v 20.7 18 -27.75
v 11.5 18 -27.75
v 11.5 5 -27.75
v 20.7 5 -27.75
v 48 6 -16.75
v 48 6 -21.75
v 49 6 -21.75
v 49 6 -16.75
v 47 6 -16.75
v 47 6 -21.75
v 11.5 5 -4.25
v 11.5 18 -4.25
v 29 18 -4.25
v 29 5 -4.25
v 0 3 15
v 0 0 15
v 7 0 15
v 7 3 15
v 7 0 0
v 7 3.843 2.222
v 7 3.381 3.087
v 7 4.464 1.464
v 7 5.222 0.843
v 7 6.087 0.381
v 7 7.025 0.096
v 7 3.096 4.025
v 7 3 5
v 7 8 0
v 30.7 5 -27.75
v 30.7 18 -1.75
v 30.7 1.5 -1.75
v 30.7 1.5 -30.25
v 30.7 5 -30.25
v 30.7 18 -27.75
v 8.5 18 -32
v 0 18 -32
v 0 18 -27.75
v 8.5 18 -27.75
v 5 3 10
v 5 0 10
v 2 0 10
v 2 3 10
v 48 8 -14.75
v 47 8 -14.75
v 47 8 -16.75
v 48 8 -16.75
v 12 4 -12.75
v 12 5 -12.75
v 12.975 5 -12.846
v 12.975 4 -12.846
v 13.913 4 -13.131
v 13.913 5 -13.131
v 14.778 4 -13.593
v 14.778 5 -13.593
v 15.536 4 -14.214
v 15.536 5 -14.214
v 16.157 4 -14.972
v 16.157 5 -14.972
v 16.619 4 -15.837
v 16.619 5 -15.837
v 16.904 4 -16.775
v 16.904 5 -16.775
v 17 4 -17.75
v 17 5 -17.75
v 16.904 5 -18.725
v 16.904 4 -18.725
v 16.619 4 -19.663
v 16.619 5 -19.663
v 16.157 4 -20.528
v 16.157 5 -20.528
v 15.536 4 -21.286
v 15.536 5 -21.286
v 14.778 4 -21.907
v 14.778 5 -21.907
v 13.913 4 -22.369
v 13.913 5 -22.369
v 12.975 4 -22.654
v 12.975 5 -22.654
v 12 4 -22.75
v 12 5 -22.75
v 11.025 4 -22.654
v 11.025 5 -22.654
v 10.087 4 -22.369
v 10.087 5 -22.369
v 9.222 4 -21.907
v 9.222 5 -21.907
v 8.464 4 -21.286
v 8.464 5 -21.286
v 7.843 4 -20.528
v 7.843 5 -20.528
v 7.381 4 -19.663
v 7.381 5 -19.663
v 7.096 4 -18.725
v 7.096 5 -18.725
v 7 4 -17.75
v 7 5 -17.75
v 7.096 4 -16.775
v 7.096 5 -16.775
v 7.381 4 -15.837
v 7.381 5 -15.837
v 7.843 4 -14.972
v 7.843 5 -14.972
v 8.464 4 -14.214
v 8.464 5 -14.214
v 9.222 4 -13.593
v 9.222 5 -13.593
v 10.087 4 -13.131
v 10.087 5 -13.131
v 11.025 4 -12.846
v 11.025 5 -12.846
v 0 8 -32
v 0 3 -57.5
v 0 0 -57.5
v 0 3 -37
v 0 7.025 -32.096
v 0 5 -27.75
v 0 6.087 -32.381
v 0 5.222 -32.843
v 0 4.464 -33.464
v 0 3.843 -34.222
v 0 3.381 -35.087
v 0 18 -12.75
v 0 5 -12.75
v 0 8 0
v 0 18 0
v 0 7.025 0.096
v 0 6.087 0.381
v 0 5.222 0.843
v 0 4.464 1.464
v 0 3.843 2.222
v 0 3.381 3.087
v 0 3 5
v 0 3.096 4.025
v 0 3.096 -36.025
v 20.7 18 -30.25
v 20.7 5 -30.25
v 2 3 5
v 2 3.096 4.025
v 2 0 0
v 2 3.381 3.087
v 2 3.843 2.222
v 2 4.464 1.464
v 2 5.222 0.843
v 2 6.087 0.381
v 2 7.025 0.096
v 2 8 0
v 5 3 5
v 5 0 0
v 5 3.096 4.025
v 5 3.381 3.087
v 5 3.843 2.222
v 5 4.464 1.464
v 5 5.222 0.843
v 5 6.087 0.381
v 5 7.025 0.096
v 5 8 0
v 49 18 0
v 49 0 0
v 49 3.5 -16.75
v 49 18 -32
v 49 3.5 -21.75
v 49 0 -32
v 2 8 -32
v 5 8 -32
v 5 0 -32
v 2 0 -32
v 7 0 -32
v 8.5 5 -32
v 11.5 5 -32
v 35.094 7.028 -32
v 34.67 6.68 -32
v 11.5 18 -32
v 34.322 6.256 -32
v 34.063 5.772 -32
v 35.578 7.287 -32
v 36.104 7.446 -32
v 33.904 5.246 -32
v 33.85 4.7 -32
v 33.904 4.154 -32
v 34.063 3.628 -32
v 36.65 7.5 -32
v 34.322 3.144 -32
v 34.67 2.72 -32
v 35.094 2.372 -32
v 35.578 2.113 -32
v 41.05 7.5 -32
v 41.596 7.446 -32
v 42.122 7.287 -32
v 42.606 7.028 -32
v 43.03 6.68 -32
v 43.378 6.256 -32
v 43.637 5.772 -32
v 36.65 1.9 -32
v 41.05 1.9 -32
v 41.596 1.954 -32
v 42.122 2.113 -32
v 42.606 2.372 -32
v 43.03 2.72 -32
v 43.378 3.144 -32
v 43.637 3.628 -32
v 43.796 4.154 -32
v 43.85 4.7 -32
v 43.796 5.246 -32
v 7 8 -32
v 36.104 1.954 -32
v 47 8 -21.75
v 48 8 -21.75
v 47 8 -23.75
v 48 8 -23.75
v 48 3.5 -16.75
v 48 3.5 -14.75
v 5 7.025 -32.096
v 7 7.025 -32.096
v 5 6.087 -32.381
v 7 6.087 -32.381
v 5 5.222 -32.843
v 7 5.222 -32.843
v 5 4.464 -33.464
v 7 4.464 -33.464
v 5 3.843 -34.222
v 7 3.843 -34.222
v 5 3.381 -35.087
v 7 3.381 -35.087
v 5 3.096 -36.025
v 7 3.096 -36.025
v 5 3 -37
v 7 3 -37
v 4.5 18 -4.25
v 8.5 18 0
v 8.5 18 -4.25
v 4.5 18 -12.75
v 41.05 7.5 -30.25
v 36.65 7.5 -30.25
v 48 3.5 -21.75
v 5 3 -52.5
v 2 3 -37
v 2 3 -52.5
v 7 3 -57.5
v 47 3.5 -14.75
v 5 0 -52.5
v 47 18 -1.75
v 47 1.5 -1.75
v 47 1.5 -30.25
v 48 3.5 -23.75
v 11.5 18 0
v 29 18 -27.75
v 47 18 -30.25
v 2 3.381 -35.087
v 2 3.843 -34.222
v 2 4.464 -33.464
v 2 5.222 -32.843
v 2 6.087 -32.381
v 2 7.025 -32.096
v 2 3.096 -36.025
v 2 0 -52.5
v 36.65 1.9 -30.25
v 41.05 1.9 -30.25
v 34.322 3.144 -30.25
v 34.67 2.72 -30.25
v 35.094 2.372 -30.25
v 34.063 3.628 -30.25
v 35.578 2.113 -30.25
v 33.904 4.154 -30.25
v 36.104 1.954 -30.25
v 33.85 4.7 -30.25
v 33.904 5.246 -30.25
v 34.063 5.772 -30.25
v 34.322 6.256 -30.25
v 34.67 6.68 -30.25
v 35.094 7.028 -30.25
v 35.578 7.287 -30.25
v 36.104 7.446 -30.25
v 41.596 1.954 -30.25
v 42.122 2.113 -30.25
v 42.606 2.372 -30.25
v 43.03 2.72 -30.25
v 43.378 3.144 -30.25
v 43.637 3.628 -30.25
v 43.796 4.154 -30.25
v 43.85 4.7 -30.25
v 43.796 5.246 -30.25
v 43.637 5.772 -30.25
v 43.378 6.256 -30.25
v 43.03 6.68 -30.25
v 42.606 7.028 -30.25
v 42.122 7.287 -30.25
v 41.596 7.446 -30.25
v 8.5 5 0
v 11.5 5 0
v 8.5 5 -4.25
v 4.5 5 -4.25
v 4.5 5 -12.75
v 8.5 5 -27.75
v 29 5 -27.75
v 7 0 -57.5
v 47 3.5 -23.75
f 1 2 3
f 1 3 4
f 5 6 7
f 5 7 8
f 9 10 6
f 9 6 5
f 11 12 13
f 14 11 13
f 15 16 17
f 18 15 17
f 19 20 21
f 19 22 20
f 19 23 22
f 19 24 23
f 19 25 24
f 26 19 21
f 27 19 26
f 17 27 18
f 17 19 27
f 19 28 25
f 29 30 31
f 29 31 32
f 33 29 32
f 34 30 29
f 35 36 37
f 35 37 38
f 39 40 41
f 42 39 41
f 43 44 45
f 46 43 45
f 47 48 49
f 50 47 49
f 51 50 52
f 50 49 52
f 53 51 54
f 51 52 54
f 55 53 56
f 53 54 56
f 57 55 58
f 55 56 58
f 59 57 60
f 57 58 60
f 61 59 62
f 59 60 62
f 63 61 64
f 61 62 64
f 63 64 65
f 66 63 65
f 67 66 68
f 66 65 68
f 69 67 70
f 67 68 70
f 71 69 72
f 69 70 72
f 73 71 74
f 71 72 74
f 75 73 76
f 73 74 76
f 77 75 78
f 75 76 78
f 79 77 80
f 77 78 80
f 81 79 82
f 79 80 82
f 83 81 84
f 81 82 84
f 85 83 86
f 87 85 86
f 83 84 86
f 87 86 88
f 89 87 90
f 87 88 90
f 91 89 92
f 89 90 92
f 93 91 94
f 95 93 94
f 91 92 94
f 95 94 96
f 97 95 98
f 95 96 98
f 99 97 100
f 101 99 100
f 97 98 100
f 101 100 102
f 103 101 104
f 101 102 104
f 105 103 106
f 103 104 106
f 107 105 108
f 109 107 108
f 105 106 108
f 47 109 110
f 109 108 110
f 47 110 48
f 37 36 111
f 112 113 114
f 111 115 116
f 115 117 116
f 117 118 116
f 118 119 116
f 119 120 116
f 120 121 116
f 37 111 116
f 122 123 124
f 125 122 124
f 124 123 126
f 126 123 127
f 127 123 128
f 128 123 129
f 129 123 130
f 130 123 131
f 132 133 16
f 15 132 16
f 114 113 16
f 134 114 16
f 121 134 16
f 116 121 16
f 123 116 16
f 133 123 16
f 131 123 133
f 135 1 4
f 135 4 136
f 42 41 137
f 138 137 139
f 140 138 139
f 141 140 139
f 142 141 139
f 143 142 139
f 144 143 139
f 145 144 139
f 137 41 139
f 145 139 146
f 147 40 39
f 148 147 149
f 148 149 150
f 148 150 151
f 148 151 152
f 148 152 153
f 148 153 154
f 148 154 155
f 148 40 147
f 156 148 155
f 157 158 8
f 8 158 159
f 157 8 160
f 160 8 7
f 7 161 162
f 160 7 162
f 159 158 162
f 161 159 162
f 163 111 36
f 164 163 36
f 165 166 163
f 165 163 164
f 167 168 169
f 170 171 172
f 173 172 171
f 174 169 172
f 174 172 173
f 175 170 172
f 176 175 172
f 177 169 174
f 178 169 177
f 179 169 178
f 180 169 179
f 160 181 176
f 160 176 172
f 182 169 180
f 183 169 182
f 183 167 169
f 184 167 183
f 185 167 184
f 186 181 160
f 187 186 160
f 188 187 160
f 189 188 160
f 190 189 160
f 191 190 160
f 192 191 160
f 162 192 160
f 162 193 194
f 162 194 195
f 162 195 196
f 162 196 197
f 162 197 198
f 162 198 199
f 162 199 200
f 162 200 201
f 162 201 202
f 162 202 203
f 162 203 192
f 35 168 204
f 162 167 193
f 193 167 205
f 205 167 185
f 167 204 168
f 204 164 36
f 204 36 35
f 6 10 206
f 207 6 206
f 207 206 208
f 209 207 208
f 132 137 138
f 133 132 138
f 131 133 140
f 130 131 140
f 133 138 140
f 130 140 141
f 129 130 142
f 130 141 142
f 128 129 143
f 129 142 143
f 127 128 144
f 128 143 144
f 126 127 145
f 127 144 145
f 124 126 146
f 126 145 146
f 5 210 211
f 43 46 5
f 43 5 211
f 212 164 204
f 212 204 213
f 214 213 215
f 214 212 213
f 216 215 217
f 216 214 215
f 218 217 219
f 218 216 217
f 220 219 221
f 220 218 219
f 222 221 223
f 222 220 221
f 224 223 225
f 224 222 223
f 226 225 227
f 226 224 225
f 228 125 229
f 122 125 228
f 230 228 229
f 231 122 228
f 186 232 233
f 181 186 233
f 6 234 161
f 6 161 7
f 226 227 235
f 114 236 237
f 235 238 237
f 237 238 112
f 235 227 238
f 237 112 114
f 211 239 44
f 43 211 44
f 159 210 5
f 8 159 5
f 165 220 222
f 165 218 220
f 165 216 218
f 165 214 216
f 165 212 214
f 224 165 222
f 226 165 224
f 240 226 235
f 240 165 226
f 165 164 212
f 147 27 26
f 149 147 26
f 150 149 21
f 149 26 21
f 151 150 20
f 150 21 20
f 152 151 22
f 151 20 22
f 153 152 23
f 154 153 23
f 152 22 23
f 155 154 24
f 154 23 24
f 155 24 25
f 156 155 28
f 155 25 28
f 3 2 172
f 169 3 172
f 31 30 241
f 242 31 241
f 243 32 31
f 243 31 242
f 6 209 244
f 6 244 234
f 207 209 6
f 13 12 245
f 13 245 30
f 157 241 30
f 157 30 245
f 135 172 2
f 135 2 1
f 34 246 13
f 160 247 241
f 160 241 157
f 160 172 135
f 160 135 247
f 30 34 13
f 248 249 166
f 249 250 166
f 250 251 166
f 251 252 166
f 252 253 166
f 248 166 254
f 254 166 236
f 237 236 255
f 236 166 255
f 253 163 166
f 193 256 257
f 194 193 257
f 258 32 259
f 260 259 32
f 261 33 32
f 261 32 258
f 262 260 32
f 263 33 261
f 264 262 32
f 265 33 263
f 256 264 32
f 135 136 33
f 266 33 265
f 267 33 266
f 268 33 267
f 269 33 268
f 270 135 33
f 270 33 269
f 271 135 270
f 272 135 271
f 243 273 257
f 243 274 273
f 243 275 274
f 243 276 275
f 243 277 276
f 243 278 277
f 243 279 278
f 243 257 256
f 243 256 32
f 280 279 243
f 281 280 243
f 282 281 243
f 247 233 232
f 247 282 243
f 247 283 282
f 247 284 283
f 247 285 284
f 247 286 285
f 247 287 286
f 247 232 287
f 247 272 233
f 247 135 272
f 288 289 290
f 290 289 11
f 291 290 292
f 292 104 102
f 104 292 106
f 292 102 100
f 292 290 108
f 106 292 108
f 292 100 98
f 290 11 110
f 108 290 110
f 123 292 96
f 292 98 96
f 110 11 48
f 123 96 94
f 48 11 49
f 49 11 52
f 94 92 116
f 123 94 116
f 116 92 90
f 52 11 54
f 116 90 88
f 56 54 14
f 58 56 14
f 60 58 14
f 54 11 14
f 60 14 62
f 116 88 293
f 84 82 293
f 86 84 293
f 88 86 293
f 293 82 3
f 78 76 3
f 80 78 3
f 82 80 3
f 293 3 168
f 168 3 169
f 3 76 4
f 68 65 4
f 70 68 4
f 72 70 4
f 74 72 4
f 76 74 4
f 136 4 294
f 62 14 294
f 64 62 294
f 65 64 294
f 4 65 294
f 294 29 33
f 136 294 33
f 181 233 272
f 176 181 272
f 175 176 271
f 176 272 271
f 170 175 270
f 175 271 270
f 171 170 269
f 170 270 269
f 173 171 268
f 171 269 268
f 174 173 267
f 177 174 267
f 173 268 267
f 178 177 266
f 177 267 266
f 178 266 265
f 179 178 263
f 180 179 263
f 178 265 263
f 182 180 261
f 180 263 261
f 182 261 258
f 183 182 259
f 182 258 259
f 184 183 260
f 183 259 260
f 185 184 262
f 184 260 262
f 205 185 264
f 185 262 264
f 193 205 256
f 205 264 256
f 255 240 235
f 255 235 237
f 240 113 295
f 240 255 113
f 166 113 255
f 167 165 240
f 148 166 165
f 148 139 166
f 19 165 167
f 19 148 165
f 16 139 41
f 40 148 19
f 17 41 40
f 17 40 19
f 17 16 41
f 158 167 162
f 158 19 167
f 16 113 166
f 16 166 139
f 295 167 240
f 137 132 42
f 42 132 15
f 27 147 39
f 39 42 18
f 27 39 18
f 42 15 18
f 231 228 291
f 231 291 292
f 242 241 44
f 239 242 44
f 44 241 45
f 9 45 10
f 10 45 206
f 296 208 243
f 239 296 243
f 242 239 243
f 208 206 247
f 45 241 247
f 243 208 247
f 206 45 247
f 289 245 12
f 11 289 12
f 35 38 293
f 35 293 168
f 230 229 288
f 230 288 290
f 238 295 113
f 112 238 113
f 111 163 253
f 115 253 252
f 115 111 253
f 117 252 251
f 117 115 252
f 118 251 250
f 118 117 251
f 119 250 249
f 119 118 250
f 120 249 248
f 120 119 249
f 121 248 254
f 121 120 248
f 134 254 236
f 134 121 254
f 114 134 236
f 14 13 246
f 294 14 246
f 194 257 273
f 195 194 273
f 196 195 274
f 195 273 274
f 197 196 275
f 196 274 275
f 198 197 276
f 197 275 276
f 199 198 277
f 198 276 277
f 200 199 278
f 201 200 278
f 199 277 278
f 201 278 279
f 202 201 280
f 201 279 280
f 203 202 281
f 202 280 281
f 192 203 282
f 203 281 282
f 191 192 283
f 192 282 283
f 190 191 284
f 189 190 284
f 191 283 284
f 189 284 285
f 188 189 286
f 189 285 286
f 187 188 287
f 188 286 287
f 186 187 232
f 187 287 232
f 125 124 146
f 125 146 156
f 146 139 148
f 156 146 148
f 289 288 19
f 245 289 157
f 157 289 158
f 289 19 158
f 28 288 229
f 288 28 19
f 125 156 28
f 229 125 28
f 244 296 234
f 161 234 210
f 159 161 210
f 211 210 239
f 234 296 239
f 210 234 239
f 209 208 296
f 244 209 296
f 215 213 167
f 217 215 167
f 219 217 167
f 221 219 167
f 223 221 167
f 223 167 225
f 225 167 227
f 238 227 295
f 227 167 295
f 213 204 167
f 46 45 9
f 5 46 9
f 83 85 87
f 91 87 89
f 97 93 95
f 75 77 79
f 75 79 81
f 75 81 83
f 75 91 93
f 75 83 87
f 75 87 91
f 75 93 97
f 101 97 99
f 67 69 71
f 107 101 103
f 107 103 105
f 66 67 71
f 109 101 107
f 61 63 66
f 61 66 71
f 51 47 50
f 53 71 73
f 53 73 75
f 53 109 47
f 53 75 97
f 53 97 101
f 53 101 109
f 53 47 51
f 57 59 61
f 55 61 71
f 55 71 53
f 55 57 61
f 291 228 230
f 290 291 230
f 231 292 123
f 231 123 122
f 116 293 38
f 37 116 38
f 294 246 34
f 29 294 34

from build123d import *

# Parameters (mm, degrees)
SKETCH_1_W           = 49
SKETCH_1_H           = 32
EXTRUDE_2_DEPTH      = 18
SKETCH_6_W           = 24.5
SKETCH_6_H           = 23.5
CUT_EXTRUDE_1_DEPTH  = 13
SKETCH_7_W           = 16.3
SKETCH_7_H           = 28.5
CUT_EXTRUDE_2_DEPTH  = 16.5
SKETCH_8_W           = 3
SKETCH_8_H           = 32
CUT_EXTRUDE_3_DEPTH  = 13
SKETCH_12_W          = 15
SKETCH_12_H          = 13
CUT_EXTRUDE_5_DEPTH  = 58.690987164
SKETCH_13_W          = 10
SKETCH_13_H          = 2.5
CUT_EXTRUDE_6_DEPTH  = 13
CUT_EXTRUDE_7_DEPTH  = 61.332930477
SKETCH_15_W          = 7
SKETCH_15_H          = 25.5
EXTRUDE_3_DEPTH      = 3
SKETCH_16_W          = 7
SKETCH_16_H          = 15
EXTRUDE_4_DEPTH      = 3
FILLET_1_R           = 5
SKETCH_17_W          = 3
SKETCH_17_H          = 10
SKETCH_17_H_2        = 20.5
CUT_EXTRUDE_8_DEPTH  = 78.661122835
SKETCH_19_R          = 5
CUT_EXTRUDE_9_DEPTH  = 1
CUT_EXTRUDE_10_DEPTH = 1
SKETCH_25_W          = 5
SKETCH_25_H          = 2.5
CUT_EXTRUDE_13_DEPTH = 78.034083366


with BuildPart() as part:
    # 草图1 → 凸台-拉伸2 (new body)
    with BuildSketch(Plane(origin=(0, 0, 0), x_dir=(1, 0, 0), z_dir=(0, 1, 0))):
        with Locations((24.5, 16)):
            Rectangle(SKETCH_1_W, SKETCH_1_H)
    extrude(amount=EXTRUDE_2_DEPTH)

    # 草图6 → 切除-拉伸1 (cut)
    with BuildSketch(Plane(origin=(0, 18, 0), x_dir=(1, 0, 0), z_dir=(0, 1, 0))):
        with Locations((16.75, 16)):
            Rectangle(SKETCH_6_W, SKETCH_6_H)
    extrude(amount=-CUT_EXTRUDE_1_DEPTH, mode=Mode.SUBTRACT)

    # 草图7 → 切除-拉伸2 (cut)
    with BuildSketch(Plane(origin=(0, 18, 0), x_dir=(1, 0, 0), z_dir=(0, 1, 0))):
        with Locations((38.85, 16)):
            Rectangle(SKETCH_7_W, SKETCH_7_H)
    extrude(amount=-CUT_EXTRUDE_2_DEPTH, mode=Mode.SUBTRACT)

    # 草图8 → 切除-拉伸3 (cut)
    with BuildSketch(Plane(origin=(0, 18, 0), x_dir=(1, 0, 0), z_dir=(0, 1, 0))):
        with Locations((10, 16)):
            Rectangle(SKETCH_8_W, SKETCH_8_H)
    extrude(amount=-CUT_EXTRUDE_3_DEPTH, mode=Mode.SUBTRACT)

    # 草图12 → 切除-拉伸5 (cut, through all)
    with BuildSketch(Plane(origin=(4.5, 0, 0), x_dir=(0, 0, -1), z_dir=(1, 0, 0))):
        with Locations((20.25, 11.5)):
            Rectangle(SKETCH_12_W, SKETCH_12_H)
    extrude(amount=-CUT_EXTRUDE_5_DEPTH, mode=Mode.SUBTRACT)

    # 草图13 → 切除-拉伸6 (cut)
    with BuildSketch(Plane(origin=(0, 18, 0), x_dir=(1, 0, 0), z_dir=(0, 1, 0))):
        with Locations((25.7, 29)):
            Rectangle(SKETCH_13_W, SKETCH_13_H)
    extrude(amount=-CUT_EXTRUDE_6_DEPTH, mode=Mode.SUBTRACT)

    # 草图14 → 切除-拉伸7 (cut, through all)
    with BuildSketch(Plane(origin=(0, 0, -1.75), x_dir=(-1, 0, 0), z_dir=(0, 0, -1))):
        with BuildLine():
            Line((-41.05, 7.5), (-36.65, 7.5))
            ThreePointArc((-36.65, 7.5), (-33.85, 4.7), (-36.65, 1.9))
            Line((-36.65, 1.9), (-41.05, 1.9))
            ThreePointArc((-41.05, 1.9), (-43.85, 4.7), (-41.05, 7.5))
        make_face()
    extrude(amount=CUT_EXTRUDE_7_DEPTH, mode=Mode.SUBTRACT)

    # 草图15 → 凸台-拉伸3 (add)
    with BuildSketch(Plane(origin=(0, 0, 0), x_dir=(-1, 0, 0), z_dir=(0, -1, 0))):
        with Locations((-3.5, 44.75)):
            Rectangle(SKETCH_15_W, SKETCH_15_H)
    extrude(amount=-EXTRUDE_3_DEPTH)

    # 草图16 → 凸台-拉伸4 (add)
    with BuildSketch(Plane.XZ):
        with Locations((3.5, 7.5)):
            Rectangle(SKETCH_16_W, SKETCH_16_H)
    extrude(amount=-EXTRUDE_4_DEPTH)

    # 圆角1
    fillet_1_edges = [part.edges().sort_by_distance(p)[0] for p in [
        (3.5, 3, -32),
        (3.5, 3, 0),
    ]]
    fillet(fillet_1_edges, radius=FILLET_1_R)

    # 草图17 → 切除-拉伸8 (cut, through all)
    with BuildSketch(Plane(origin=(0, 0, 0), x_dir=(-1, 0, 0), z_dir=(0, -1, 0))):
        with Locations((-3.5, -5)):
            Rectangle(SKETCH_17_W, SKETCH_17_H)
        with Locations((-3.5, 42.25)):
            Rectangle(SKETCH_17_W, SKETCH_17_H_2)
    extrude(amount=-CUT_EXTRUDE_8_DEPTH, mode=Mode.SUBTRACT)

    # 草图19 → 切除-拉伸9 (cut)
    with BuildSketch(Plane(origin=(0, 5, 0), x_dir=(1, 0, 0), z_dir=(0, 1, 0))):
        with Locations(Location((12, 17.75, 0), (0, 0, 270))):
            Circle(SKETCH_19_R)
    extrude(amount=-CUT_EXTRUDE_9_DEPTH, mode=Mode.SUBTRACT)

    # 草图20 → 切除-拉伸10 (cut)
    with BuildSketch(Plane.ZY.offset(-47)):
        Polygon((-23.75, 3.5), (-14.75, 3.5), (-14.75, 6), (-14.75, 8), (-16.75, 8), (-16.75, 6), (-21.75, 6), (-21.75, 8), (-23.75, 8), (-23.75, 6), align=None)
    extrude(amount=-CUT_EXTRUDE_10_DEPTH, mode=Mode.SUBTRACT)

    # 草图25 → 切除-拉伸13 (cut, through all)
    with BuildSketch(Plane.ZY.offset(-48)):
        with Locations((-19.25, 4.75)):
            Rectangle(SKETCH_25_W, SKETCH_25_H)
    extrude(amount=-CUT_EXTRUDE_13_DEPTH, mode=Mode.SUBTRACT)


solid = part.part
